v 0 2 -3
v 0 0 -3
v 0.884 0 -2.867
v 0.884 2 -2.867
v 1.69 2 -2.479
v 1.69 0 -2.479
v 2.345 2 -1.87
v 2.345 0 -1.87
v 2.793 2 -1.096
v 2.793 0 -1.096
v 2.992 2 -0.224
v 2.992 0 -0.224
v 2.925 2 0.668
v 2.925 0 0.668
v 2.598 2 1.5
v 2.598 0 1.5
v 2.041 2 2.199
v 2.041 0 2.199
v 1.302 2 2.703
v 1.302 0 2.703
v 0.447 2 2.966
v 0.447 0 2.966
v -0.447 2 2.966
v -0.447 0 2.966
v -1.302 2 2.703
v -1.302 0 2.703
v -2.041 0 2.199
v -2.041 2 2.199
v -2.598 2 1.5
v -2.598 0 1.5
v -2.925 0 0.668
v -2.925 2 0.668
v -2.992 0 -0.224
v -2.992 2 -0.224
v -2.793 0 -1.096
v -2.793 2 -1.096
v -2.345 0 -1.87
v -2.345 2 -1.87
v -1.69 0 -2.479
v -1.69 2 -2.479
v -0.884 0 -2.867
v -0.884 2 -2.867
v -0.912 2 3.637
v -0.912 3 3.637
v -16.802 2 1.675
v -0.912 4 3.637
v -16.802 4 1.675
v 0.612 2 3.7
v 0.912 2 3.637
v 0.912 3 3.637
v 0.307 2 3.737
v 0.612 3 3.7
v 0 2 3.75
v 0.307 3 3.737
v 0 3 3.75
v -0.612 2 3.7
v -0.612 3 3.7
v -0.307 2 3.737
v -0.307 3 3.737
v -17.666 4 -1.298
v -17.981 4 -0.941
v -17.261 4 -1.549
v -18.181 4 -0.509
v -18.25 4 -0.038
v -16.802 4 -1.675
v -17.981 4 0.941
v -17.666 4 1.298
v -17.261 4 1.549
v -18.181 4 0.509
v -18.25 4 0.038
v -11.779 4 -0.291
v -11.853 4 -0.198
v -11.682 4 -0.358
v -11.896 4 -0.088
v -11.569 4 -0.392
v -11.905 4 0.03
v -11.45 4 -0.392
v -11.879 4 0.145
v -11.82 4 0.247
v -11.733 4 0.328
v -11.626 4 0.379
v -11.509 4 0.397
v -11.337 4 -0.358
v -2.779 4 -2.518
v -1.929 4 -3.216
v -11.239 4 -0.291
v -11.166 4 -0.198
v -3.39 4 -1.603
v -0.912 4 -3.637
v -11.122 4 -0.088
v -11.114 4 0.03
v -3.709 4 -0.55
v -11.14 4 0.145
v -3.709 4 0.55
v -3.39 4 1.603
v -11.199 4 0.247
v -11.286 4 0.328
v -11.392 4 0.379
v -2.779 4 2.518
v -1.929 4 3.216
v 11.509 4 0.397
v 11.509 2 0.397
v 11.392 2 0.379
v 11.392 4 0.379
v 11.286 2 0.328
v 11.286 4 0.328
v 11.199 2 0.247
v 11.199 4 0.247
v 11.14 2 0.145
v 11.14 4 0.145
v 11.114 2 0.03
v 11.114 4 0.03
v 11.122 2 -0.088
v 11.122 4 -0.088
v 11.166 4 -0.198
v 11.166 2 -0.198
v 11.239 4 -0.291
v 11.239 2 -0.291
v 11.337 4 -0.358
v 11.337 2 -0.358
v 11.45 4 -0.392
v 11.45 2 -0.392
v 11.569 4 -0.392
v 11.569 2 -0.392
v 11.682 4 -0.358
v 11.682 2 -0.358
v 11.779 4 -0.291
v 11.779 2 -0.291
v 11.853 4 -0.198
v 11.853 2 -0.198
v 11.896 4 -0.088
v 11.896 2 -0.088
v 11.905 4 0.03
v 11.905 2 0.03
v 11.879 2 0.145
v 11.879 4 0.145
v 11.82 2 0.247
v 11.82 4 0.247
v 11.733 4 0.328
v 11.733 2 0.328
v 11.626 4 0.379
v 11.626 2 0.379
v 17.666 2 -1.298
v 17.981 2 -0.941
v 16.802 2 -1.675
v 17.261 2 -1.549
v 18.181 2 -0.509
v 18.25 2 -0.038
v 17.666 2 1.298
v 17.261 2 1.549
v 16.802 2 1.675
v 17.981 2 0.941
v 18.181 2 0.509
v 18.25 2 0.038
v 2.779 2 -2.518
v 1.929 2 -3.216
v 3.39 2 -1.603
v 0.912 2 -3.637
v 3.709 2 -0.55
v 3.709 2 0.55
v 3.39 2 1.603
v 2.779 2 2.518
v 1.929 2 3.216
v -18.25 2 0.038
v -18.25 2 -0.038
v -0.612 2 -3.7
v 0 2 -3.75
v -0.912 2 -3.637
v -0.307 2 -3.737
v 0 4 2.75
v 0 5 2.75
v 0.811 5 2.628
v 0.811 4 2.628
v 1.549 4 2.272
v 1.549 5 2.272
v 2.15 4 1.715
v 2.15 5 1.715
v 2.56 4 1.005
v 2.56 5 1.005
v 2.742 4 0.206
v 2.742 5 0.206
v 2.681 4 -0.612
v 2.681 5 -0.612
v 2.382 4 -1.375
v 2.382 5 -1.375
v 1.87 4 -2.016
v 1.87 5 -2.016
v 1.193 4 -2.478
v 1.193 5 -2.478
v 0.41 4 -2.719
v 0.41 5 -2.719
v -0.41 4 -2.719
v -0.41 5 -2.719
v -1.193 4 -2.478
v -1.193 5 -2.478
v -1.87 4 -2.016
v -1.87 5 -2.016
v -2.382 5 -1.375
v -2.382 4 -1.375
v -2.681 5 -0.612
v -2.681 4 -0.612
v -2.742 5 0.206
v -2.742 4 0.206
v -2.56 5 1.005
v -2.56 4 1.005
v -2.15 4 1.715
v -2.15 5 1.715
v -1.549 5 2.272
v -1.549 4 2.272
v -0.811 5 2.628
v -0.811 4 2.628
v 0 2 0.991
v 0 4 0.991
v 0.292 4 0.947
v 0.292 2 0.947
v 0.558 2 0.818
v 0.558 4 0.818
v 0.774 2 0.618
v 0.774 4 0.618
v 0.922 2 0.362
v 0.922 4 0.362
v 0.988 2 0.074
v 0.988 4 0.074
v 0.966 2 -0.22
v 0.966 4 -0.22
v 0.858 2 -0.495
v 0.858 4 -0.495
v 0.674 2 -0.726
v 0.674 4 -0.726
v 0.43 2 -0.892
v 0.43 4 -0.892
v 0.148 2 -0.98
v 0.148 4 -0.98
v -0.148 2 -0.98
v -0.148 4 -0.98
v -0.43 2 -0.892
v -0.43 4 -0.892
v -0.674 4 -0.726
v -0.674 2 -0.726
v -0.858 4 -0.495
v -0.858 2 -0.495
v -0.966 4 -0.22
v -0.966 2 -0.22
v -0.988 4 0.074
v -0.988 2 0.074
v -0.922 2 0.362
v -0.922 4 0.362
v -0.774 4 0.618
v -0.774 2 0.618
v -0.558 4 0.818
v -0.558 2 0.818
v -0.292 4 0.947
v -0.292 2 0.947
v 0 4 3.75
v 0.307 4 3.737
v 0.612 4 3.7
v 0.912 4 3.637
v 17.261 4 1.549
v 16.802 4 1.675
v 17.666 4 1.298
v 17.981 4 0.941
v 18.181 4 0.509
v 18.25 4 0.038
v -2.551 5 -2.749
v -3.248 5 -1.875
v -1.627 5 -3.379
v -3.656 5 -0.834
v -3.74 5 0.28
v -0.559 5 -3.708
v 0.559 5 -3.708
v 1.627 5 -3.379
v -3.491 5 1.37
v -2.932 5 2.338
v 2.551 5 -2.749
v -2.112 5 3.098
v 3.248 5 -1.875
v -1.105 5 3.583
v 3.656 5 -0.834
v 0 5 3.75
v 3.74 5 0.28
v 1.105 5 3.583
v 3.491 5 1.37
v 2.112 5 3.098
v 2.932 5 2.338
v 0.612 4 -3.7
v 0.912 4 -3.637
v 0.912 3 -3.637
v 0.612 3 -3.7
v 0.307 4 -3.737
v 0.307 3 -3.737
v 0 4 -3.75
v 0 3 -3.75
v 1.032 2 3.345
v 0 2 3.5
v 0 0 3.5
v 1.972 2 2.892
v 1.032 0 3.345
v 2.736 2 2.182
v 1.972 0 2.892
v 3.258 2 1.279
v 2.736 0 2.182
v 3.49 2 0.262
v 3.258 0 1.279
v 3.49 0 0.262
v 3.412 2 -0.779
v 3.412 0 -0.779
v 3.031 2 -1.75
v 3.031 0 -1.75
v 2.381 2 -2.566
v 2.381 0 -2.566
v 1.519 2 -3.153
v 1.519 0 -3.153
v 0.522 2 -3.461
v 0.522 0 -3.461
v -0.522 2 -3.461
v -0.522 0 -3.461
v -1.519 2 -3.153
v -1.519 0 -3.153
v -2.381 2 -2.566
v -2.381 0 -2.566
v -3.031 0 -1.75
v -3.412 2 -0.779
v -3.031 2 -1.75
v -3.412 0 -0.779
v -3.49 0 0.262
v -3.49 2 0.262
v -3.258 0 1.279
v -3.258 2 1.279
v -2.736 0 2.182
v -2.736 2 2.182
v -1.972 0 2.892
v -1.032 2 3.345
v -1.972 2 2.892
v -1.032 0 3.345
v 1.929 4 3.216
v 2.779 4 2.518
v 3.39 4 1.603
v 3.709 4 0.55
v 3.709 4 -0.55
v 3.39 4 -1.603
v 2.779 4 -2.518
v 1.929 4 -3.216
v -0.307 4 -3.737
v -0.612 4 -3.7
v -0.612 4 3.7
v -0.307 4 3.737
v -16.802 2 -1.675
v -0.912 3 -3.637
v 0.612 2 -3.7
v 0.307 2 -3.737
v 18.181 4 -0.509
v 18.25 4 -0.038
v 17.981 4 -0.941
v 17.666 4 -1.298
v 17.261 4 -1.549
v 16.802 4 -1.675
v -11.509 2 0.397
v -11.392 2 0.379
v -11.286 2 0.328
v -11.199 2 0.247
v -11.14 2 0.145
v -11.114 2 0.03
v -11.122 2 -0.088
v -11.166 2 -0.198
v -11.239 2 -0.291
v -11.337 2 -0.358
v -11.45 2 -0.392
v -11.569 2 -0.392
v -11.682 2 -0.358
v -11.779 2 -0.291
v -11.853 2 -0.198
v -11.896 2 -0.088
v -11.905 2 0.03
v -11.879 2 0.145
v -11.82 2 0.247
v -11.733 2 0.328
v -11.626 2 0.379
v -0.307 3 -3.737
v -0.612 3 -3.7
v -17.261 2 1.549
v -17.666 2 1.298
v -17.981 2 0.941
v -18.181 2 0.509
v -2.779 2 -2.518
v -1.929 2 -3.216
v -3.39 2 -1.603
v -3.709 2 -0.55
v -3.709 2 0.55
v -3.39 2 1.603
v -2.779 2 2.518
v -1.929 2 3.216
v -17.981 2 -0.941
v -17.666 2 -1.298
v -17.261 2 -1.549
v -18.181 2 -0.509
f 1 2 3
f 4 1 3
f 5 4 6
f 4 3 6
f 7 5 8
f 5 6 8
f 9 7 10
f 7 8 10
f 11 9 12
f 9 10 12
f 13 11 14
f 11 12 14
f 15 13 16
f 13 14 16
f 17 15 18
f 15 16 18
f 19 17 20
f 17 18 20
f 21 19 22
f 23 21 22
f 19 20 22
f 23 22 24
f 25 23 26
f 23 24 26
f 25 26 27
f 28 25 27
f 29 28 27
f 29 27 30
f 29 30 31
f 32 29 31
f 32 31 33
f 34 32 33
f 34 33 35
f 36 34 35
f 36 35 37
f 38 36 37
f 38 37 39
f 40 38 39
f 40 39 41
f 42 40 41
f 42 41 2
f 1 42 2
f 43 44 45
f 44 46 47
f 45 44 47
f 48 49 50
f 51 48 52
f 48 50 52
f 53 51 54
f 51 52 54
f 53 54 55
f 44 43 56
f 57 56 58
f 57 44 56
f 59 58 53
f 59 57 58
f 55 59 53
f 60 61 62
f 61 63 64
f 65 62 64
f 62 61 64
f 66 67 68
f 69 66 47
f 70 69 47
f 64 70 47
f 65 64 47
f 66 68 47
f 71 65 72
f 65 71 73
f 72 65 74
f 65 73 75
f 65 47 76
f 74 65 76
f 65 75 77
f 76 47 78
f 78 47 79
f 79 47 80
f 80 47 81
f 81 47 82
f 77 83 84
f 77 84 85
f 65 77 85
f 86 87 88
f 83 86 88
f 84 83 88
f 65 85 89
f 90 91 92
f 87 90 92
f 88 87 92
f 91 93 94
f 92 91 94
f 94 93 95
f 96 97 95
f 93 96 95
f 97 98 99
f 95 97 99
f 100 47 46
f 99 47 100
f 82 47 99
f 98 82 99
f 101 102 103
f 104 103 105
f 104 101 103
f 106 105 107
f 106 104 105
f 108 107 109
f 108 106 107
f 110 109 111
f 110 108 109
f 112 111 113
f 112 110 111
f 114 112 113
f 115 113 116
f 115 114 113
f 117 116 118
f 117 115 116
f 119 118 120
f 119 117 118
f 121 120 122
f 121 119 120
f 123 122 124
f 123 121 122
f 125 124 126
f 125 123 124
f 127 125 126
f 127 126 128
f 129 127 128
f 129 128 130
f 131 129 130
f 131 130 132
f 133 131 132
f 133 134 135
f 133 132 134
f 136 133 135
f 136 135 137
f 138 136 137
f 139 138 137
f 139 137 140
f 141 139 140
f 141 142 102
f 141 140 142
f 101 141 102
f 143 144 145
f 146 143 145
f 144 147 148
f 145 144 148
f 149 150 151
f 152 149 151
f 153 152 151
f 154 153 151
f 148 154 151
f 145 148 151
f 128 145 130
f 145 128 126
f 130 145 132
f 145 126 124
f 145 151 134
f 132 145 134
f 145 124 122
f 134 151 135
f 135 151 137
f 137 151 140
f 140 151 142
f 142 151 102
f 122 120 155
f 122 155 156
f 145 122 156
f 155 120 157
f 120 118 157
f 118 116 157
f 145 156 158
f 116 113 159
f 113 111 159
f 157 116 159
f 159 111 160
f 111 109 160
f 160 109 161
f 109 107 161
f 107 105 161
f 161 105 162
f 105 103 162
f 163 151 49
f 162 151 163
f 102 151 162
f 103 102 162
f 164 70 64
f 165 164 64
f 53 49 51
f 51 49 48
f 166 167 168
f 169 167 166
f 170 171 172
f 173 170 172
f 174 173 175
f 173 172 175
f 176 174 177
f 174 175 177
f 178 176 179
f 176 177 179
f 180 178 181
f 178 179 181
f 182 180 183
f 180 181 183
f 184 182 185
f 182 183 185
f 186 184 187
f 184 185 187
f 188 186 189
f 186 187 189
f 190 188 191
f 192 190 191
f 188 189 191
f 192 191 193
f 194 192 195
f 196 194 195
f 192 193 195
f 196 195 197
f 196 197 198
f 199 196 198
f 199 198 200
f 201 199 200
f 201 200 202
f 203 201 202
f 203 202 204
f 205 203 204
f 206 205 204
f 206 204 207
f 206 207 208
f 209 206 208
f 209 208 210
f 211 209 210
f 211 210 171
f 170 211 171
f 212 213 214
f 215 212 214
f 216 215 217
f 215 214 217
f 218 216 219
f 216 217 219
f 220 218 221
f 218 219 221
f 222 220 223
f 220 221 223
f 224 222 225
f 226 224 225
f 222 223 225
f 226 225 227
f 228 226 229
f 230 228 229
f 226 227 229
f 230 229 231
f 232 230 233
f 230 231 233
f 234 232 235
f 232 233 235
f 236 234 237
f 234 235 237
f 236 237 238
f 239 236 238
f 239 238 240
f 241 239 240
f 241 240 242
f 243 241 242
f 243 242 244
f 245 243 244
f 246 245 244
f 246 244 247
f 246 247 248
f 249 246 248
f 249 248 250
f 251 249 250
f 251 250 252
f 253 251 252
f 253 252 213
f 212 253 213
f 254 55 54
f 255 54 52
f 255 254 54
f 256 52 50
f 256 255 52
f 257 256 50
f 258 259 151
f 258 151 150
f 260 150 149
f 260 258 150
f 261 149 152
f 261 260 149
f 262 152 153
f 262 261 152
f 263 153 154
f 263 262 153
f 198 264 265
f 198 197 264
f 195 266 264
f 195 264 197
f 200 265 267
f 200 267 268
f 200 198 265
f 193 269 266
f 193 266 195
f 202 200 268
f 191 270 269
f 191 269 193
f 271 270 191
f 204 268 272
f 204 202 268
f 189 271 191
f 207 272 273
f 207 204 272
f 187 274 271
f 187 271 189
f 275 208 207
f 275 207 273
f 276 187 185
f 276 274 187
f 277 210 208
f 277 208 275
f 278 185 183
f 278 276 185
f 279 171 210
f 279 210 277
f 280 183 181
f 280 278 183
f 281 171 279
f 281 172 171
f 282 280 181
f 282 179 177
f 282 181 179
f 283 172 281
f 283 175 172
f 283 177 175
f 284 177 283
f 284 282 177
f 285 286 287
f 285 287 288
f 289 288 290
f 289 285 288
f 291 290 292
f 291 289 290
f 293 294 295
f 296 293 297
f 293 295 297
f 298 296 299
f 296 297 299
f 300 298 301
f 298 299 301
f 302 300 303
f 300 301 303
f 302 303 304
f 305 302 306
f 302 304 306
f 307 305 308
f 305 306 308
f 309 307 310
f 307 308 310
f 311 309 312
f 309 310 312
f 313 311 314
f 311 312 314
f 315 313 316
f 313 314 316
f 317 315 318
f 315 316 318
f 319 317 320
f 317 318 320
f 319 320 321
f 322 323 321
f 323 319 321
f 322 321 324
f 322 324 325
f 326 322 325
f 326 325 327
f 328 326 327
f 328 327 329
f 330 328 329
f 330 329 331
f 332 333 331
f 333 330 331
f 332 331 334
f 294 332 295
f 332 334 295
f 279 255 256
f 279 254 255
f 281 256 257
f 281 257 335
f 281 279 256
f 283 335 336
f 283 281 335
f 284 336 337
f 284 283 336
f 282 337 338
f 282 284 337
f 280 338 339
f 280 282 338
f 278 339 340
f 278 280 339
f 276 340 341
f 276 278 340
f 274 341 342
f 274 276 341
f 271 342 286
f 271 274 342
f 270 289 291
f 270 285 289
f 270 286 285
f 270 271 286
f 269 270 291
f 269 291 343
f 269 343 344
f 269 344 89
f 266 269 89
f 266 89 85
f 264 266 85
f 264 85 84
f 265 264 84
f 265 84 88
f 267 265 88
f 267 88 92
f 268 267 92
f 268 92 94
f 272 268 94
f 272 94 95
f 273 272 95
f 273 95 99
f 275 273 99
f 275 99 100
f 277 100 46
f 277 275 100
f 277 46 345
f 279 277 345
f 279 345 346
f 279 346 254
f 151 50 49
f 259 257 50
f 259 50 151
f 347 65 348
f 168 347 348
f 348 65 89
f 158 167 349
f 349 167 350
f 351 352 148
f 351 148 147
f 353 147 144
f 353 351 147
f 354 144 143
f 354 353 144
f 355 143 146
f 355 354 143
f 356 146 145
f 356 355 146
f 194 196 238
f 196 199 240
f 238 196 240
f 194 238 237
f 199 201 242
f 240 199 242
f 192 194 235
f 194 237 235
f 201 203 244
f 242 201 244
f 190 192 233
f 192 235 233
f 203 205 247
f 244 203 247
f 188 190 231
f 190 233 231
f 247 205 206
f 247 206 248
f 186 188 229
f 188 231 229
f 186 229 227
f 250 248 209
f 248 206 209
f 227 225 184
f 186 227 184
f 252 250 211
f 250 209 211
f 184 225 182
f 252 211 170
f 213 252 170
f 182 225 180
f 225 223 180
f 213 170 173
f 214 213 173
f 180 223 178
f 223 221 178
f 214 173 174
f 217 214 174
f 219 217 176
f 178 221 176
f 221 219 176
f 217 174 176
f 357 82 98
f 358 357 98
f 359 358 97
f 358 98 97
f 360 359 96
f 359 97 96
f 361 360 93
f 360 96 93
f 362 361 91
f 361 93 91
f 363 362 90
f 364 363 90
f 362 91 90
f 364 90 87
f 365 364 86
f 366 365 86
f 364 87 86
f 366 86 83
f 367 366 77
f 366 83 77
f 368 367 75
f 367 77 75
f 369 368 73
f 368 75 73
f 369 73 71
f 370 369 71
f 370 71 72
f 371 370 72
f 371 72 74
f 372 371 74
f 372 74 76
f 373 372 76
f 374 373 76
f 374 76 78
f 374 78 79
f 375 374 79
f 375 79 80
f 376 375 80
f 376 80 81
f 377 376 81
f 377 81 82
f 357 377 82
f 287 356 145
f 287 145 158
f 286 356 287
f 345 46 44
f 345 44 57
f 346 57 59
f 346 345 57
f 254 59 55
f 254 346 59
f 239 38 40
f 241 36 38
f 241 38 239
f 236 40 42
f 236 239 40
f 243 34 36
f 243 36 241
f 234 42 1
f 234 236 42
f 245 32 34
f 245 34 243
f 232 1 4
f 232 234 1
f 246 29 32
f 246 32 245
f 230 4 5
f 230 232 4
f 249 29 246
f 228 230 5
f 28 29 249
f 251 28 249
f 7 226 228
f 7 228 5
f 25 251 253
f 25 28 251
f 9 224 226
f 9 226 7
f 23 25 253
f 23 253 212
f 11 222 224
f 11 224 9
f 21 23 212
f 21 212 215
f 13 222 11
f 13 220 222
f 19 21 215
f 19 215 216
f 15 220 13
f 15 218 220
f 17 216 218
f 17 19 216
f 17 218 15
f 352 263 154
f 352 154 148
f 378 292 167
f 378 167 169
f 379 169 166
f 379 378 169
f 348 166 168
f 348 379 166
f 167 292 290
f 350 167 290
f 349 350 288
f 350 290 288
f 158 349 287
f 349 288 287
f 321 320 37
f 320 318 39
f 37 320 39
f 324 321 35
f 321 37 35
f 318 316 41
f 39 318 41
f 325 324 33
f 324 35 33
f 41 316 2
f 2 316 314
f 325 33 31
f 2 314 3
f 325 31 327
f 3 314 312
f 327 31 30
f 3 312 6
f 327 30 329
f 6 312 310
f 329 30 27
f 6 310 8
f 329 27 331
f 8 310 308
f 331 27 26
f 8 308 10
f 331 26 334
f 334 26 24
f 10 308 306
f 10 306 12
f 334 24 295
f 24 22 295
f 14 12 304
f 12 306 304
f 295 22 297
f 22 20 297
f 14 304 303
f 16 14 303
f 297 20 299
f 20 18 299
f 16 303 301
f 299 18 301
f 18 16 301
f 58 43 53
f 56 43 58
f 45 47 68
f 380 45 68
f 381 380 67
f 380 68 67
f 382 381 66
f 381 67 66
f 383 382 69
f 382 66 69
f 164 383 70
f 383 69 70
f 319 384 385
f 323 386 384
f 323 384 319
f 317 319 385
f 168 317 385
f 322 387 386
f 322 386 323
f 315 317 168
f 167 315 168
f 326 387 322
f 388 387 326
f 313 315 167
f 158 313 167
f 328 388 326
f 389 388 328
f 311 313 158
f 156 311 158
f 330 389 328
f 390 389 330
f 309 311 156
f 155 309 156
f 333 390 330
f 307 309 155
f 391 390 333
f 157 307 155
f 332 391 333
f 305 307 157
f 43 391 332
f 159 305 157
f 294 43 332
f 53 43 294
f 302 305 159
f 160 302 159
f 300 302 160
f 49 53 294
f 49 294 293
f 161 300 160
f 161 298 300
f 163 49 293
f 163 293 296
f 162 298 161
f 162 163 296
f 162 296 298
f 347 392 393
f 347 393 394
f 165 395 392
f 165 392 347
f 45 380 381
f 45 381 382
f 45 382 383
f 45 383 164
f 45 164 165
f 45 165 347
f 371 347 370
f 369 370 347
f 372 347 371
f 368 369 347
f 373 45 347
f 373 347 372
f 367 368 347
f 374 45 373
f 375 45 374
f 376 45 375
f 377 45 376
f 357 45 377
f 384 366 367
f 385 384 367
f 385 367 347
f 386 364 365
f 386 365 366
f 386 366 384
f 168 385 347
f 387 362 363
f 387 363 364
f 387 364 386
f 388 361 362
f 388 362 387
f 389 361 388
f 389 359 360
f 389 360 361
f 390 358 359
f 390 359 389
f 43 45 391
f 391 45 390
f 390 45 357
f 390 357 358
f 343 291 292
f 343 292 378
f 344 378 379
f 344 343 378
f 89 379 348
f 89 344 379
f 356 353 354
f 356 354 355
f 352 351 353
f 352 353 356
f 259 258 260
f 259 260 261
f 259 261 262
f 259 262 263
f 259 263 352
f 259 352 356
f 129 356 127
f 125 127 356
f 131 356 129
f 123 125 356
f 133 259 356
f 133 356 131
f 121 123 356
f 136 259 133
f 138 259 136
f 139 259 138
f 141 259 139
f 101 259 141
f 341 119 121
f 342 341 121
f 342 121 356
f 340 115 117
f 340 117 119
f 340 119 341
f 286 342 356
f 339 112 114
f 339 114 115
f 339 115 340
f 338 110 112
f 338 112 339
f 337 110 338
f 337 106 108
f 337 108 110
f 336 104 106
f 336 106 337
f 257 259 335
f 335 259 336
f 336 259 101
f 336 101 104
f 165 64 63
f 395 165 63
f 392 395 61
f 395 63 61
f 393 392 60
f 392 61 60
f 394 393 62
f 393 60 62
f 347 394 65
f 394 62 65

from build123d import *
from build123d.topology import SkipClean

# Parameters (mm, degrees)
SKETCH1_R           = 3.5
BOSS_EXTRUDE1_DEPTH = 5
SKETCH2_R           = 3
CUT_EXTRUDE1_DEPTH  = 4
SKETCH4_R           = 3.75
BOSS_EXTRUDE2_DEPTH = 2
SKETCH5_R           = 2.75
CUT_EXTRUDE2_DEPTH  = 1.8
SKETCH6_R           = 1.190625
CUT_EXTRUDE3_DEPTH  = 1.8
BOSS_EXTRUDE3_START = -1
BOSS_EXTRUDE3_DEPTH = 2
SKETCH9_R           = 0.9906
CUT_EXTRUDE4_DEPTH  = 20.055839
SKETCH10_R          = 0.396875
CUT_EXTRUDE5_DEPTH  = 20.055839


with BuildPart() as part:
    # Sketch1 → Boss-Extrude1 (new body)
    with BuildSketch(Plane(origin=(0, 0, 0), x_dir=(1, 0, 0), z_dir=(0, 1, 0))):
        Circle(SKETCH1_R)
    extrude(amount=BOSS_EXTRUDE1_DEPTH)

    # Sketch2 → Cut-Extrude1 (cut)
    with BuildSketch(Plane.XZ):
        Circle(SKETCH2_R)
    extrude(amount=-CUT_EXTRUDE1_DEPTH, mode=Mode.SUBTRACT)

    # Sketch4 → Boss-Extrude2 (add)
    with BuildSketch(Plane(origin=(0, 5, 0), x_dir=(1, 0, 0), z_dir=(0, 1, 0))):
        Circle(SKETCH4_R)
    extrude(amount=-BOSS_EXTRUDE2_DEPTH)

    # Sketch5 → Cut-Extrude2 (cut)
    with BuildSketch(Plane(origin=(0, 5, 0), x_dir=(1, 0, 0), z_dir=(0, 1, 0))):
        Circle(SKETCH5_R)
    extrude(amount=-CUT_EXTRUDE2_DEPTH, mode=Mode.SUBTRACT)

    # Sketch6 → Cut-Extrude3 (cut)
    with BuildSketch(Plane(origin=(0, 3.2, 0), x_dir=(1, 0, 0), z_dir=(0, 1, 0))):
        Circle(SKETCH6_R)
    extrude(amount=-CUT_EXTRUDE3_DEPTH, mode=Mode.SUBTRACT)

    # Sketch8 → Boss-Extrude3 (add)
    with SkipClean():  # the faces are left unmerged after this step: merging them gives an invalid solid
        with BuildSketch(Plane.XZ.offset(-3).offset(BOSS_EXTRUDE3_START)):
            with BuildLine():
                Line((0, 3.75), (-16.802200952, 1.675319737))
                ThreePointArc((-16.802200952, 1.675319737), (-17.83614958, 1.130657807), (-18.25, 0.037756066))
                Line((-18.25, 0.037756066), (-18.25, -0.037756066))
                ThreePointArc((-18.25, -0.037756066), (-17.83614958, -1.130657807), (-16.802200952, -1.675319737))
                Line((-16.802200952, -1.675319737), (0, -3.75))
                ThreePointArc((0, -3.75), (3.75, 0), (0, 3.75))
            make_face()
        boss_extrude3 = extrude(amount=BOSS_EXTRUDE3_DEPTH)
    add(part.part.scale(1), mode=Mode.REPLACE)  # the faces are merged on a copy

    # Mirror1: Boss-Extrude3 across plane
    add(boss_extrude3.mirror(Plane(origin=(0, 0, 0), x_dir=(0, 0, 1), z_dir=(1, 0, 0))))

    # Sketch9 → Cut-Extrude4 (cut, through all)
    with BuildSketch(Plane(origin=(0, 4, 0), x_dir=(1, 0, 0), z_dir=(0, 1, 0))):
        Circle(SKETCH9_R)
    extrude(amount=-CUT_EXTRUDE4_DEPTH, mode=Mode.SUBTRACT)

    # Sketch10 → Cut-Extrude5 (cut, through all)
    with BuildSketch(Plane(origin=(0, 4, 0), x_dir=(1, 0, 0), z_dir=(0, 1, 0))):
        with Locations((-11.509375, 0)):
            Circle(SKETCH10_R)
    cut_extrude5 = extrude(amount=-CUT_EXTRUDE5_DEPTH, mode=Mode.SUBTRACT)

    # Mirror2: Cut-Extrude5 across plane
    add(cut_extrude5.mirror(Plane(origin=(0, 0, 0), x_dir=(0, 0, 1), z_dir=(1, 0, 0))), mode=Mode.SUBTRACT)


solid = part.part
